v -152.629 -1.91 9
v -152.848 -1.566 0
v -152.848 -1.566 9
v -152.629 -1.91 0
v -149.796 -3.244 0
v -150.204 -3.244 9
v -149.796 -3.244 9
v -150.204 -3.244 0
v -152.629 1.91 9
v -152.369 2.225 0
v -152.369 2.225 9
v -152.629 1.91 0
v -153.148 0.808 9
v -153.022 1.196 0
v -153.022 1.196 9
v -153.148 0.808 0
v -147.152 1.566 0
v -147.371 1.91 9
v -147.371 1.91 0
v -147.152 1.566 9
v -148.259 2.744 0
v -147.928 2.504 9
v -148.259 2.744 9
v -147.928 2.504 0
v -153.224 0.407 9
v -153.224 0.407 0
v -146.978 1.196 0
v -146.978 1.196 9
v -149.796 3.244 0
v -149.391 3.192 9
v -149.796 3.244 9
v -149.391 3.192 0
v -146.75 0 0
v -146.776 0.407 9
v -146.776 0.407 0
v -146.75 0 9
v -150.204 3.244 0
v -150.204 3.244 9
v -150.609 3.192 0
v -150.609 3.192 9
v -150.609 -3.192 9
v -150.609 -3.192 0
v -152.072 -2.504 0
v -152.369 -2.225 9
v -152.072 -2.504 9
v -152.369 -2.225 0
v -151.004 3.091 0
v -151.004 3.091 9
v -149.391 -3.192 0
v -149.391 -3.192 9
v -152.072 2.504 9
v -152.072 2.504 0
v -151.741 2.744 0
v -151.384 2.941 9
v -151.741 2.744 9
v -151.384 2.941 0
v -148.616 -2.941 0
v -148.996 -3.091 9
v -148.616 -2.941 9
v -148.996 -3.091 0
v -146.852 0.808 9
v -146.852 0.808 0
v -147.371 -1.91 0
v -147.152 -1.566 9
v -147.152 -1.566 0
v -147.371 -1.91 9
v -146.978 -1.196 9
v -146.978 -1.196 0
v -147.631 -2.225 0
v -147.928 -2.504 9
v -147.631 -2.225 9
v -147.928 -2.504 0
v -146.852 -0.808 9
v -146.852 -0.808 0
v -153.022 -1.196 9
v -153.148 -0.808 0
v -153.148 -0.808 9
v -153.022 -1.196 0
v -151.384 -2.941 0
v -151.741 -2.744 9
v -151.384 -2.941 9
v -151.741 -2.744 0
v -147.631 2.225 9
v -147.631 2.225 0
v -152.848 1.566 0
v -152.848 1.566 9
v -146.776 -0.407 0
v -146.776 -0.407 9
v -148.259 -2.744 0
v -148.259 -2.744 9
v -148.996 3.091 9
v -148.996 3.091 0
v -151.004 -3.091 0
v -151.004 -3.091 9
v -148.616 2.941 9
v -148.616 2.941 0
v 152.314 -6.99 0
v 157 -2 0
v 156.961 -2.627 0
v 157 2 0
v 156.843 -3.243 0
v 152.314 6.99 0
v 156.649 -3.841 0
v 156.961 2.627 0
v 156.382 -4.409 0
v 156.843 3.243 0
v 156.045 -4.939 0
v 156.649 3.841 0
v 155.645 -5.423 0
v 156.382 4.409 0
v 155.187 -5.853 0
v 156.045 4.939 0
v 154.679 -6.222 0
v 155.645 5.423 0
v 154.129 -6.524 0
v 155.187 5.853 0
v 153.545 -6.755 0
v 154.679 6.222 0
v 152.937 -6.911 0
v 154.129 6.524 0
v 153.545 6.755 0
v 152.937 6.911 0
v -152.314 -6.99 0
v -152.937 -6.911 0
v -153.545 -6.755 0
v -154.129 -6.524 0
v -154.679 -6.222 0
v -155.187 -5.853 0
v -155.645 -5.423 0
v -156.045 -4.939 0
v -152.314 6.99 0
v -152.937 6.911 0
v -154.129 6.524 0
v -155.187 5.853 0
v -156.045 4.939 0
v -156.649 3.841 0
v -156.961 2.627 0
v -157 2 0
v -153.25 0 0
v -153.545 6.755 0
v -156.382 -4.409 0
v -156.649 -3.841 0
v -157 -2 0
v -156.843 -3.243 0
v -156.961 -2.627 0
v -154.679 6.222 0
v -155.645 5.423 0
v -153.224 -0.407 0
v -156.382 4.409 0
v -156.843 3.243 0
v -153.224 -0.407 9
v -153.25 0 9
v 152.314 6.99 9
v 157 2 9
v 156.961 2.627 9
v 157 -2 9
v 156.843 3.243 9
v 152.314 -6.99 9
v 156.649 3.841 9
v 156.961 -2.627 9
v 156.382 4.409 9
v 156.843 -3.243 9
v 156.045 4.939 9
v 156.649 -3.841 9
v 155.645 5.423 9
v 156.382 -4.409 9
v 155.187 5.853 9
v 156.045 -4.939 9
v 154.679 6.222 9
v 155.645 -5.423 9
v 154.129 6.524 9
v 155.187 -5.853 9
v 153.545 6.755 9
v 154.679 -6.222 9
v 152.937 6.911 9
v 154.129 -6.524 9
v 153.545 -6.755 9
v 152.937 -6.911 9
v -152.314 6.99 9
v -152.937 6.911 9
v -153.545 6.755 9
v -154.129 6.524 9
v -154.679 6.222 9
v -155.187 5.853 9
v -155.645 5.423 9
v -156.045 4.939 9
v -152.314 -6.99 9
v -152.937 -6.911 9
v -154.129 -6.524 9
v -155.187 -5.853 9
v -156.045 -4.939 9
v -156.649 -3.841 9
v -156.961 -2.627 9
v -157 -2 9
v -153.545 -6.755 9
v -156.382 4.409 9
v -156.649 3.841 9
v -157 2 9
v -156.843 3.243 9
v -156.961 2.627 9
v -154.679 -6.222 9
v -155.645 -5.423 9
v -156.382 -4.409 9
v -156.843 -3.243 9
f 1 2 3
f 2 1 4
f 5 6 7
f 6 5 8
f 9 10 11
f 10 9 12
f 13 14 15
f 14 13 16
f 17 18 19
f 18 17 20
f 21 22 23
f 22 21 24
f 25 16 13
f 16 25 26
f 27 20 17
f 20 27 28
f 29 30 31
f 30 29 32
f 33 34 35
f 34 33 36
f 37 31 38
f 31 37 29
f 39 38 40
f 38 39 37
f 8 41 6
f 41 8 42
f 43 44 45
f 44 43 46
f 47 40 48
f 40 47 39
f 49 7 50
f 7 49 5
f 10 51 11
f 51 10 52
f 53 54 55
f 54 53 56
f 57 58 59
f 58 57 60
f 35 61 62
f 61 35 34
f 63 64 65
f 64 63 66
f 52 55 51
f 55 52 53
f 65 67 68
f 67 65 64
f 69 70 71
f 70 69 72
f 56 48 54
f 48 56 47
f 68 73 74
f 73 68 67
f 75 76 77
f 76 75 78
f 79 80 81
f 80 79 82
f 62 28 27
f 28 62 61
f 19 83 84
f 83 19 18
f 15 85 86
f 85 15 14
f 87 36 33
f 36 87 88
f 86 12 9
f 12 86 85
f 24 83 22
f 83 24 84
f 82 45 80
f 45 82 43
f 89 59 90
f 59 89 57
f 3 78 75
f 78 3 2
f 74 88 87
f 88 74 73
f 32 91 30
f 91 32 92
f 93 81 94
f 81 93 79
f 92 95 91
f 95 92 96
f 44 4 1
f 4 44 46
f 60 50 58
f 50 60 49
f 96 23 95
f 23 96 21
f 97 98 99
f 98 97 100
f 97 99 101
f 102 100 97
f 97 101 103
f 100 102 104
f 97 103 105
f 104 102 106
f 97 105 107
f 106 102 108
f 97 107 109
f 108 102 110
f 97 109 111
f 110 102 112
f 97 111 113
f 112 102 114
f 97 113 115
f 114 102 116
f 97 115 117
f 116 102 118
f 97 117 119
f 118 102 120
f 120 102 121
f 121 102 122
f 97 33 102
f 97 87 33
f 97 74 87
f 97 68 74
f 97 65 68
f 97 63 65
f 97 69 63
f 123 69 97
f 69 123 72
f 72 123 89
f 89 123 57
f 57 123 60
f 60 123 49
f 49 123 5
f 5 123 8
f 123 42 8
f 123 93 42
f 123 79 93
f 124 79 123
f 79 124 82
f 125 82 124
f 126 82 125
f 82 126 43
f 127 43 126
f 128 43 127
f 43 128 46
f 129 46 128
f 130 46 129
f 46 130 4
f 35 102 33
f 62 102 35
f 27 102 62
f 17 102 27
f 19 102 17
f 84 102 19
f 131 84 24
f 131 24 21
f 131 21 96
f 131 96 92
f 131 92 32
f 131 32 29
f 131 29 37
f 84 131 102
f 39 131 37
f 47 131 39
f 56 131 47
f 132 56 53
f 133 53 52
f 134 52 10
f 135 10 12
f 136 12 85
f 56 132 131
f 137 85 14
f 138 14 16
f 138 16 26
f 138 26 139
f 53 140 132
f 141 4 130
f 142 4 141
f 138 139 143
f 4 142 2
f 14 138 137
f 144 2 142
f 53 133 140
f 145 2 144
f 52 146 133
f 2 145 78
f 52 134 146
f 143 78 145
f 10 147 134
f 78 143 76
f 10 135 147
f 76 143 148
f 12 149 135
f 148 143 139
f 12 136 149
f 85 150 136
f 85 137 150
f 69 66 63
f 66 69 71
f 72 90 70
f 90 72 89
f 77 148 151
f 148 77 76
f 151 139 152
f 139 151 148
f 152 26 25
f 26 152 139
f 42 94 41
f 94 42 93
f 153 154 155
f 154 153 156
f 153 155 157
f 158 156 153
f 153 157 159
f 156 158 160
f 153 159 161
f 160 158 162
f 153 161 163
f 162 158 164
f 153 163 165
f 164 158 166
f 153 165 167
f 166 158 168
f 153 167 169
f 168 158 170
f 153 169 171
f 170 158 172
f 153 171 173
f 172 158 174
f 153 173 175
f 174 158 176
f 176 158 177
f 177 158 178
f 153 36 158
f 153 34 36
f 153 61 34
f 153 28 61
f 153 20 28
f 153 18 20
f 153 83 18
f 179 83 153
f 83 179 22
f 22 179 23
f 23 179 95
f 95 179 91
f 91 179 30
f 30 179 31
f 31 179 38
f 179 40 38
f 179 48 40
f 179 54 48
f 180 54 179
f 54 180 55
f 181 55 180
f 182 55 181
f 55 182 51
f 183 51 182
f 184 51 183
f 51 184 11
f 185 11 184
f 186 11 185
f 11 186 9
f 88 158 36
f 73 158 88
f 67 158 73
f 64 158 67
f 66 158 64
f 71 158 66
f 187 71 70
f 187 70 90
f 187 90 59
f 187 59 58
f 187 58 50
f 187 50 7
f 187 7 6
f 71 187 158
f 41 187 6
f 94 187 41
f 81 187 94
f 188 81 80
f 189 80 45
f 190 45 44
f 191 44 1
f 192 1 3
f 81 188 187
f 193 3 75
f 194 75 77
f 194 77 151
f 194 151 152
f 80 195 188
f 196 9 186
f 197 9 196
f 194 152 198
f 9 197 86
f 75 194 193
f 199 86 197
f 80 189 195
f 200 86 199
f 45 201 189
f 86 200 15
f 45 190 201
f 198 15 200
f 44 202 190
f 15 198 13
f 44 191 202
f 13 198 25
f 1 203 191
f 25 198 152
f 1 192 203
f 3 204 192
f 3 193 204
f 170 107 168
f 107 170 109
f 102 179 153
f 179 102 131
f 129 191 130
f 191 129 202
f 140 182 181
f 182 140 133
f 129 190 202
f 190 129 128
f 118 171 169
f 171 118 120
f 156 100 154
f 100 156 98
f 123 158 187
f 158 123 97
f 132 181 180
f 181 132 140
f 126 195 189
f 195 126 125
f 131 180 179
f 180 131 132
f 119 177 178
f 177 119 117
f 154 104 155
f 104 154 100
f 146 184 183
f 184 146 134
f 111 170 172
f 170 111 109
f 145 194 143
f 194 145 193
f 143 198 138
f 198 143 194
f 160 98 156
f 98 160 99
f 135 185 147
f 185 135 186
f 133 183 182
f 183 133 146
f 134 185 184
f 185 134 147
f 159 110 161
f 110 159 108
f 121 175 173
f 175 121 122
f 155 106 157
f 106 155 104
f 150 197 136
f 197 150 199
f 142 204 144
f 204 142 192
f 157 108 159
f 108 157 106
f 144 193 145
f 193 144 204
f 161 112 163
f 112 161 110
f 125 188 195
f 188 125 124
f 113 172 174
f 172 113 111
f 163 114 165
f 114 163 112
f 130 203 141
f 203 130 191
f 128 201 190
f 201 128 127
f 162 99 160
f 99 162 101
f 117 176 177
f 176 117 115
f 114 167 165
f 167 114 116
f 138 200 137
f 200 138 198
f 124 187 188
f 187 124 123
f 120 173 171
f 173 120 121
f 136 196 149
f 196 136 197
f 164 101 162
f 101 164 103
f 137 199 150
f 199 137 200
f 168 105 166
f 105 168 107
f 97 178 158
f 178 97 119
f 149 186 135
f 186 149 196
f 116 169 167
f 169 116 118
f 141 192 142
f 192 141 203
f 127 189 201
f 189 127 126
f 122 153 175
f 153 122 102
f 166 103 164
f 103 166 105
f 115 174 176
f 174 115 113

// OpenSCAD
$fn = 50;


difference() {
	union() {
		hull() {
			translate(v = [-152.0000000000, 2.0000000000, 0]) {
				cylinder(h = 9, r = 5);
			}
			translate(v = [152.0000000000, 2.0000000000, 0]) {
				cylinder(h = 9, r = 5);
			}
			translate(v = [-152.0000000000, -2.0000000000, 0]) {
				cylinder(h = 9, r = 5);
			}
			translate(v = [152.0000000000, -2.0000000000, 0]) {
				cylinder(h = 9, r = 5);
			}
		}
	}
	union() {
		translate(v = [-150.0000000000, 0.0000000000, 0]) {
			cylinder(h = 9, r = 3.2500000000);
		}
		translate(v = [-150.0000000000, 0.0000000000, 0]) {
			cylinder(h = 9, r = 1.8000000000);
		}
		translate(v = [-150.0000000000, 0.0000000000, 0]) {
			cylinder(h = 9, r = 1.8000000000);
		}
		translate(v = [-150.0000000000, 0.0000000000, 0]) {
			cylinder(h = 9, r = 1.8000000000);
		}
	}
}
